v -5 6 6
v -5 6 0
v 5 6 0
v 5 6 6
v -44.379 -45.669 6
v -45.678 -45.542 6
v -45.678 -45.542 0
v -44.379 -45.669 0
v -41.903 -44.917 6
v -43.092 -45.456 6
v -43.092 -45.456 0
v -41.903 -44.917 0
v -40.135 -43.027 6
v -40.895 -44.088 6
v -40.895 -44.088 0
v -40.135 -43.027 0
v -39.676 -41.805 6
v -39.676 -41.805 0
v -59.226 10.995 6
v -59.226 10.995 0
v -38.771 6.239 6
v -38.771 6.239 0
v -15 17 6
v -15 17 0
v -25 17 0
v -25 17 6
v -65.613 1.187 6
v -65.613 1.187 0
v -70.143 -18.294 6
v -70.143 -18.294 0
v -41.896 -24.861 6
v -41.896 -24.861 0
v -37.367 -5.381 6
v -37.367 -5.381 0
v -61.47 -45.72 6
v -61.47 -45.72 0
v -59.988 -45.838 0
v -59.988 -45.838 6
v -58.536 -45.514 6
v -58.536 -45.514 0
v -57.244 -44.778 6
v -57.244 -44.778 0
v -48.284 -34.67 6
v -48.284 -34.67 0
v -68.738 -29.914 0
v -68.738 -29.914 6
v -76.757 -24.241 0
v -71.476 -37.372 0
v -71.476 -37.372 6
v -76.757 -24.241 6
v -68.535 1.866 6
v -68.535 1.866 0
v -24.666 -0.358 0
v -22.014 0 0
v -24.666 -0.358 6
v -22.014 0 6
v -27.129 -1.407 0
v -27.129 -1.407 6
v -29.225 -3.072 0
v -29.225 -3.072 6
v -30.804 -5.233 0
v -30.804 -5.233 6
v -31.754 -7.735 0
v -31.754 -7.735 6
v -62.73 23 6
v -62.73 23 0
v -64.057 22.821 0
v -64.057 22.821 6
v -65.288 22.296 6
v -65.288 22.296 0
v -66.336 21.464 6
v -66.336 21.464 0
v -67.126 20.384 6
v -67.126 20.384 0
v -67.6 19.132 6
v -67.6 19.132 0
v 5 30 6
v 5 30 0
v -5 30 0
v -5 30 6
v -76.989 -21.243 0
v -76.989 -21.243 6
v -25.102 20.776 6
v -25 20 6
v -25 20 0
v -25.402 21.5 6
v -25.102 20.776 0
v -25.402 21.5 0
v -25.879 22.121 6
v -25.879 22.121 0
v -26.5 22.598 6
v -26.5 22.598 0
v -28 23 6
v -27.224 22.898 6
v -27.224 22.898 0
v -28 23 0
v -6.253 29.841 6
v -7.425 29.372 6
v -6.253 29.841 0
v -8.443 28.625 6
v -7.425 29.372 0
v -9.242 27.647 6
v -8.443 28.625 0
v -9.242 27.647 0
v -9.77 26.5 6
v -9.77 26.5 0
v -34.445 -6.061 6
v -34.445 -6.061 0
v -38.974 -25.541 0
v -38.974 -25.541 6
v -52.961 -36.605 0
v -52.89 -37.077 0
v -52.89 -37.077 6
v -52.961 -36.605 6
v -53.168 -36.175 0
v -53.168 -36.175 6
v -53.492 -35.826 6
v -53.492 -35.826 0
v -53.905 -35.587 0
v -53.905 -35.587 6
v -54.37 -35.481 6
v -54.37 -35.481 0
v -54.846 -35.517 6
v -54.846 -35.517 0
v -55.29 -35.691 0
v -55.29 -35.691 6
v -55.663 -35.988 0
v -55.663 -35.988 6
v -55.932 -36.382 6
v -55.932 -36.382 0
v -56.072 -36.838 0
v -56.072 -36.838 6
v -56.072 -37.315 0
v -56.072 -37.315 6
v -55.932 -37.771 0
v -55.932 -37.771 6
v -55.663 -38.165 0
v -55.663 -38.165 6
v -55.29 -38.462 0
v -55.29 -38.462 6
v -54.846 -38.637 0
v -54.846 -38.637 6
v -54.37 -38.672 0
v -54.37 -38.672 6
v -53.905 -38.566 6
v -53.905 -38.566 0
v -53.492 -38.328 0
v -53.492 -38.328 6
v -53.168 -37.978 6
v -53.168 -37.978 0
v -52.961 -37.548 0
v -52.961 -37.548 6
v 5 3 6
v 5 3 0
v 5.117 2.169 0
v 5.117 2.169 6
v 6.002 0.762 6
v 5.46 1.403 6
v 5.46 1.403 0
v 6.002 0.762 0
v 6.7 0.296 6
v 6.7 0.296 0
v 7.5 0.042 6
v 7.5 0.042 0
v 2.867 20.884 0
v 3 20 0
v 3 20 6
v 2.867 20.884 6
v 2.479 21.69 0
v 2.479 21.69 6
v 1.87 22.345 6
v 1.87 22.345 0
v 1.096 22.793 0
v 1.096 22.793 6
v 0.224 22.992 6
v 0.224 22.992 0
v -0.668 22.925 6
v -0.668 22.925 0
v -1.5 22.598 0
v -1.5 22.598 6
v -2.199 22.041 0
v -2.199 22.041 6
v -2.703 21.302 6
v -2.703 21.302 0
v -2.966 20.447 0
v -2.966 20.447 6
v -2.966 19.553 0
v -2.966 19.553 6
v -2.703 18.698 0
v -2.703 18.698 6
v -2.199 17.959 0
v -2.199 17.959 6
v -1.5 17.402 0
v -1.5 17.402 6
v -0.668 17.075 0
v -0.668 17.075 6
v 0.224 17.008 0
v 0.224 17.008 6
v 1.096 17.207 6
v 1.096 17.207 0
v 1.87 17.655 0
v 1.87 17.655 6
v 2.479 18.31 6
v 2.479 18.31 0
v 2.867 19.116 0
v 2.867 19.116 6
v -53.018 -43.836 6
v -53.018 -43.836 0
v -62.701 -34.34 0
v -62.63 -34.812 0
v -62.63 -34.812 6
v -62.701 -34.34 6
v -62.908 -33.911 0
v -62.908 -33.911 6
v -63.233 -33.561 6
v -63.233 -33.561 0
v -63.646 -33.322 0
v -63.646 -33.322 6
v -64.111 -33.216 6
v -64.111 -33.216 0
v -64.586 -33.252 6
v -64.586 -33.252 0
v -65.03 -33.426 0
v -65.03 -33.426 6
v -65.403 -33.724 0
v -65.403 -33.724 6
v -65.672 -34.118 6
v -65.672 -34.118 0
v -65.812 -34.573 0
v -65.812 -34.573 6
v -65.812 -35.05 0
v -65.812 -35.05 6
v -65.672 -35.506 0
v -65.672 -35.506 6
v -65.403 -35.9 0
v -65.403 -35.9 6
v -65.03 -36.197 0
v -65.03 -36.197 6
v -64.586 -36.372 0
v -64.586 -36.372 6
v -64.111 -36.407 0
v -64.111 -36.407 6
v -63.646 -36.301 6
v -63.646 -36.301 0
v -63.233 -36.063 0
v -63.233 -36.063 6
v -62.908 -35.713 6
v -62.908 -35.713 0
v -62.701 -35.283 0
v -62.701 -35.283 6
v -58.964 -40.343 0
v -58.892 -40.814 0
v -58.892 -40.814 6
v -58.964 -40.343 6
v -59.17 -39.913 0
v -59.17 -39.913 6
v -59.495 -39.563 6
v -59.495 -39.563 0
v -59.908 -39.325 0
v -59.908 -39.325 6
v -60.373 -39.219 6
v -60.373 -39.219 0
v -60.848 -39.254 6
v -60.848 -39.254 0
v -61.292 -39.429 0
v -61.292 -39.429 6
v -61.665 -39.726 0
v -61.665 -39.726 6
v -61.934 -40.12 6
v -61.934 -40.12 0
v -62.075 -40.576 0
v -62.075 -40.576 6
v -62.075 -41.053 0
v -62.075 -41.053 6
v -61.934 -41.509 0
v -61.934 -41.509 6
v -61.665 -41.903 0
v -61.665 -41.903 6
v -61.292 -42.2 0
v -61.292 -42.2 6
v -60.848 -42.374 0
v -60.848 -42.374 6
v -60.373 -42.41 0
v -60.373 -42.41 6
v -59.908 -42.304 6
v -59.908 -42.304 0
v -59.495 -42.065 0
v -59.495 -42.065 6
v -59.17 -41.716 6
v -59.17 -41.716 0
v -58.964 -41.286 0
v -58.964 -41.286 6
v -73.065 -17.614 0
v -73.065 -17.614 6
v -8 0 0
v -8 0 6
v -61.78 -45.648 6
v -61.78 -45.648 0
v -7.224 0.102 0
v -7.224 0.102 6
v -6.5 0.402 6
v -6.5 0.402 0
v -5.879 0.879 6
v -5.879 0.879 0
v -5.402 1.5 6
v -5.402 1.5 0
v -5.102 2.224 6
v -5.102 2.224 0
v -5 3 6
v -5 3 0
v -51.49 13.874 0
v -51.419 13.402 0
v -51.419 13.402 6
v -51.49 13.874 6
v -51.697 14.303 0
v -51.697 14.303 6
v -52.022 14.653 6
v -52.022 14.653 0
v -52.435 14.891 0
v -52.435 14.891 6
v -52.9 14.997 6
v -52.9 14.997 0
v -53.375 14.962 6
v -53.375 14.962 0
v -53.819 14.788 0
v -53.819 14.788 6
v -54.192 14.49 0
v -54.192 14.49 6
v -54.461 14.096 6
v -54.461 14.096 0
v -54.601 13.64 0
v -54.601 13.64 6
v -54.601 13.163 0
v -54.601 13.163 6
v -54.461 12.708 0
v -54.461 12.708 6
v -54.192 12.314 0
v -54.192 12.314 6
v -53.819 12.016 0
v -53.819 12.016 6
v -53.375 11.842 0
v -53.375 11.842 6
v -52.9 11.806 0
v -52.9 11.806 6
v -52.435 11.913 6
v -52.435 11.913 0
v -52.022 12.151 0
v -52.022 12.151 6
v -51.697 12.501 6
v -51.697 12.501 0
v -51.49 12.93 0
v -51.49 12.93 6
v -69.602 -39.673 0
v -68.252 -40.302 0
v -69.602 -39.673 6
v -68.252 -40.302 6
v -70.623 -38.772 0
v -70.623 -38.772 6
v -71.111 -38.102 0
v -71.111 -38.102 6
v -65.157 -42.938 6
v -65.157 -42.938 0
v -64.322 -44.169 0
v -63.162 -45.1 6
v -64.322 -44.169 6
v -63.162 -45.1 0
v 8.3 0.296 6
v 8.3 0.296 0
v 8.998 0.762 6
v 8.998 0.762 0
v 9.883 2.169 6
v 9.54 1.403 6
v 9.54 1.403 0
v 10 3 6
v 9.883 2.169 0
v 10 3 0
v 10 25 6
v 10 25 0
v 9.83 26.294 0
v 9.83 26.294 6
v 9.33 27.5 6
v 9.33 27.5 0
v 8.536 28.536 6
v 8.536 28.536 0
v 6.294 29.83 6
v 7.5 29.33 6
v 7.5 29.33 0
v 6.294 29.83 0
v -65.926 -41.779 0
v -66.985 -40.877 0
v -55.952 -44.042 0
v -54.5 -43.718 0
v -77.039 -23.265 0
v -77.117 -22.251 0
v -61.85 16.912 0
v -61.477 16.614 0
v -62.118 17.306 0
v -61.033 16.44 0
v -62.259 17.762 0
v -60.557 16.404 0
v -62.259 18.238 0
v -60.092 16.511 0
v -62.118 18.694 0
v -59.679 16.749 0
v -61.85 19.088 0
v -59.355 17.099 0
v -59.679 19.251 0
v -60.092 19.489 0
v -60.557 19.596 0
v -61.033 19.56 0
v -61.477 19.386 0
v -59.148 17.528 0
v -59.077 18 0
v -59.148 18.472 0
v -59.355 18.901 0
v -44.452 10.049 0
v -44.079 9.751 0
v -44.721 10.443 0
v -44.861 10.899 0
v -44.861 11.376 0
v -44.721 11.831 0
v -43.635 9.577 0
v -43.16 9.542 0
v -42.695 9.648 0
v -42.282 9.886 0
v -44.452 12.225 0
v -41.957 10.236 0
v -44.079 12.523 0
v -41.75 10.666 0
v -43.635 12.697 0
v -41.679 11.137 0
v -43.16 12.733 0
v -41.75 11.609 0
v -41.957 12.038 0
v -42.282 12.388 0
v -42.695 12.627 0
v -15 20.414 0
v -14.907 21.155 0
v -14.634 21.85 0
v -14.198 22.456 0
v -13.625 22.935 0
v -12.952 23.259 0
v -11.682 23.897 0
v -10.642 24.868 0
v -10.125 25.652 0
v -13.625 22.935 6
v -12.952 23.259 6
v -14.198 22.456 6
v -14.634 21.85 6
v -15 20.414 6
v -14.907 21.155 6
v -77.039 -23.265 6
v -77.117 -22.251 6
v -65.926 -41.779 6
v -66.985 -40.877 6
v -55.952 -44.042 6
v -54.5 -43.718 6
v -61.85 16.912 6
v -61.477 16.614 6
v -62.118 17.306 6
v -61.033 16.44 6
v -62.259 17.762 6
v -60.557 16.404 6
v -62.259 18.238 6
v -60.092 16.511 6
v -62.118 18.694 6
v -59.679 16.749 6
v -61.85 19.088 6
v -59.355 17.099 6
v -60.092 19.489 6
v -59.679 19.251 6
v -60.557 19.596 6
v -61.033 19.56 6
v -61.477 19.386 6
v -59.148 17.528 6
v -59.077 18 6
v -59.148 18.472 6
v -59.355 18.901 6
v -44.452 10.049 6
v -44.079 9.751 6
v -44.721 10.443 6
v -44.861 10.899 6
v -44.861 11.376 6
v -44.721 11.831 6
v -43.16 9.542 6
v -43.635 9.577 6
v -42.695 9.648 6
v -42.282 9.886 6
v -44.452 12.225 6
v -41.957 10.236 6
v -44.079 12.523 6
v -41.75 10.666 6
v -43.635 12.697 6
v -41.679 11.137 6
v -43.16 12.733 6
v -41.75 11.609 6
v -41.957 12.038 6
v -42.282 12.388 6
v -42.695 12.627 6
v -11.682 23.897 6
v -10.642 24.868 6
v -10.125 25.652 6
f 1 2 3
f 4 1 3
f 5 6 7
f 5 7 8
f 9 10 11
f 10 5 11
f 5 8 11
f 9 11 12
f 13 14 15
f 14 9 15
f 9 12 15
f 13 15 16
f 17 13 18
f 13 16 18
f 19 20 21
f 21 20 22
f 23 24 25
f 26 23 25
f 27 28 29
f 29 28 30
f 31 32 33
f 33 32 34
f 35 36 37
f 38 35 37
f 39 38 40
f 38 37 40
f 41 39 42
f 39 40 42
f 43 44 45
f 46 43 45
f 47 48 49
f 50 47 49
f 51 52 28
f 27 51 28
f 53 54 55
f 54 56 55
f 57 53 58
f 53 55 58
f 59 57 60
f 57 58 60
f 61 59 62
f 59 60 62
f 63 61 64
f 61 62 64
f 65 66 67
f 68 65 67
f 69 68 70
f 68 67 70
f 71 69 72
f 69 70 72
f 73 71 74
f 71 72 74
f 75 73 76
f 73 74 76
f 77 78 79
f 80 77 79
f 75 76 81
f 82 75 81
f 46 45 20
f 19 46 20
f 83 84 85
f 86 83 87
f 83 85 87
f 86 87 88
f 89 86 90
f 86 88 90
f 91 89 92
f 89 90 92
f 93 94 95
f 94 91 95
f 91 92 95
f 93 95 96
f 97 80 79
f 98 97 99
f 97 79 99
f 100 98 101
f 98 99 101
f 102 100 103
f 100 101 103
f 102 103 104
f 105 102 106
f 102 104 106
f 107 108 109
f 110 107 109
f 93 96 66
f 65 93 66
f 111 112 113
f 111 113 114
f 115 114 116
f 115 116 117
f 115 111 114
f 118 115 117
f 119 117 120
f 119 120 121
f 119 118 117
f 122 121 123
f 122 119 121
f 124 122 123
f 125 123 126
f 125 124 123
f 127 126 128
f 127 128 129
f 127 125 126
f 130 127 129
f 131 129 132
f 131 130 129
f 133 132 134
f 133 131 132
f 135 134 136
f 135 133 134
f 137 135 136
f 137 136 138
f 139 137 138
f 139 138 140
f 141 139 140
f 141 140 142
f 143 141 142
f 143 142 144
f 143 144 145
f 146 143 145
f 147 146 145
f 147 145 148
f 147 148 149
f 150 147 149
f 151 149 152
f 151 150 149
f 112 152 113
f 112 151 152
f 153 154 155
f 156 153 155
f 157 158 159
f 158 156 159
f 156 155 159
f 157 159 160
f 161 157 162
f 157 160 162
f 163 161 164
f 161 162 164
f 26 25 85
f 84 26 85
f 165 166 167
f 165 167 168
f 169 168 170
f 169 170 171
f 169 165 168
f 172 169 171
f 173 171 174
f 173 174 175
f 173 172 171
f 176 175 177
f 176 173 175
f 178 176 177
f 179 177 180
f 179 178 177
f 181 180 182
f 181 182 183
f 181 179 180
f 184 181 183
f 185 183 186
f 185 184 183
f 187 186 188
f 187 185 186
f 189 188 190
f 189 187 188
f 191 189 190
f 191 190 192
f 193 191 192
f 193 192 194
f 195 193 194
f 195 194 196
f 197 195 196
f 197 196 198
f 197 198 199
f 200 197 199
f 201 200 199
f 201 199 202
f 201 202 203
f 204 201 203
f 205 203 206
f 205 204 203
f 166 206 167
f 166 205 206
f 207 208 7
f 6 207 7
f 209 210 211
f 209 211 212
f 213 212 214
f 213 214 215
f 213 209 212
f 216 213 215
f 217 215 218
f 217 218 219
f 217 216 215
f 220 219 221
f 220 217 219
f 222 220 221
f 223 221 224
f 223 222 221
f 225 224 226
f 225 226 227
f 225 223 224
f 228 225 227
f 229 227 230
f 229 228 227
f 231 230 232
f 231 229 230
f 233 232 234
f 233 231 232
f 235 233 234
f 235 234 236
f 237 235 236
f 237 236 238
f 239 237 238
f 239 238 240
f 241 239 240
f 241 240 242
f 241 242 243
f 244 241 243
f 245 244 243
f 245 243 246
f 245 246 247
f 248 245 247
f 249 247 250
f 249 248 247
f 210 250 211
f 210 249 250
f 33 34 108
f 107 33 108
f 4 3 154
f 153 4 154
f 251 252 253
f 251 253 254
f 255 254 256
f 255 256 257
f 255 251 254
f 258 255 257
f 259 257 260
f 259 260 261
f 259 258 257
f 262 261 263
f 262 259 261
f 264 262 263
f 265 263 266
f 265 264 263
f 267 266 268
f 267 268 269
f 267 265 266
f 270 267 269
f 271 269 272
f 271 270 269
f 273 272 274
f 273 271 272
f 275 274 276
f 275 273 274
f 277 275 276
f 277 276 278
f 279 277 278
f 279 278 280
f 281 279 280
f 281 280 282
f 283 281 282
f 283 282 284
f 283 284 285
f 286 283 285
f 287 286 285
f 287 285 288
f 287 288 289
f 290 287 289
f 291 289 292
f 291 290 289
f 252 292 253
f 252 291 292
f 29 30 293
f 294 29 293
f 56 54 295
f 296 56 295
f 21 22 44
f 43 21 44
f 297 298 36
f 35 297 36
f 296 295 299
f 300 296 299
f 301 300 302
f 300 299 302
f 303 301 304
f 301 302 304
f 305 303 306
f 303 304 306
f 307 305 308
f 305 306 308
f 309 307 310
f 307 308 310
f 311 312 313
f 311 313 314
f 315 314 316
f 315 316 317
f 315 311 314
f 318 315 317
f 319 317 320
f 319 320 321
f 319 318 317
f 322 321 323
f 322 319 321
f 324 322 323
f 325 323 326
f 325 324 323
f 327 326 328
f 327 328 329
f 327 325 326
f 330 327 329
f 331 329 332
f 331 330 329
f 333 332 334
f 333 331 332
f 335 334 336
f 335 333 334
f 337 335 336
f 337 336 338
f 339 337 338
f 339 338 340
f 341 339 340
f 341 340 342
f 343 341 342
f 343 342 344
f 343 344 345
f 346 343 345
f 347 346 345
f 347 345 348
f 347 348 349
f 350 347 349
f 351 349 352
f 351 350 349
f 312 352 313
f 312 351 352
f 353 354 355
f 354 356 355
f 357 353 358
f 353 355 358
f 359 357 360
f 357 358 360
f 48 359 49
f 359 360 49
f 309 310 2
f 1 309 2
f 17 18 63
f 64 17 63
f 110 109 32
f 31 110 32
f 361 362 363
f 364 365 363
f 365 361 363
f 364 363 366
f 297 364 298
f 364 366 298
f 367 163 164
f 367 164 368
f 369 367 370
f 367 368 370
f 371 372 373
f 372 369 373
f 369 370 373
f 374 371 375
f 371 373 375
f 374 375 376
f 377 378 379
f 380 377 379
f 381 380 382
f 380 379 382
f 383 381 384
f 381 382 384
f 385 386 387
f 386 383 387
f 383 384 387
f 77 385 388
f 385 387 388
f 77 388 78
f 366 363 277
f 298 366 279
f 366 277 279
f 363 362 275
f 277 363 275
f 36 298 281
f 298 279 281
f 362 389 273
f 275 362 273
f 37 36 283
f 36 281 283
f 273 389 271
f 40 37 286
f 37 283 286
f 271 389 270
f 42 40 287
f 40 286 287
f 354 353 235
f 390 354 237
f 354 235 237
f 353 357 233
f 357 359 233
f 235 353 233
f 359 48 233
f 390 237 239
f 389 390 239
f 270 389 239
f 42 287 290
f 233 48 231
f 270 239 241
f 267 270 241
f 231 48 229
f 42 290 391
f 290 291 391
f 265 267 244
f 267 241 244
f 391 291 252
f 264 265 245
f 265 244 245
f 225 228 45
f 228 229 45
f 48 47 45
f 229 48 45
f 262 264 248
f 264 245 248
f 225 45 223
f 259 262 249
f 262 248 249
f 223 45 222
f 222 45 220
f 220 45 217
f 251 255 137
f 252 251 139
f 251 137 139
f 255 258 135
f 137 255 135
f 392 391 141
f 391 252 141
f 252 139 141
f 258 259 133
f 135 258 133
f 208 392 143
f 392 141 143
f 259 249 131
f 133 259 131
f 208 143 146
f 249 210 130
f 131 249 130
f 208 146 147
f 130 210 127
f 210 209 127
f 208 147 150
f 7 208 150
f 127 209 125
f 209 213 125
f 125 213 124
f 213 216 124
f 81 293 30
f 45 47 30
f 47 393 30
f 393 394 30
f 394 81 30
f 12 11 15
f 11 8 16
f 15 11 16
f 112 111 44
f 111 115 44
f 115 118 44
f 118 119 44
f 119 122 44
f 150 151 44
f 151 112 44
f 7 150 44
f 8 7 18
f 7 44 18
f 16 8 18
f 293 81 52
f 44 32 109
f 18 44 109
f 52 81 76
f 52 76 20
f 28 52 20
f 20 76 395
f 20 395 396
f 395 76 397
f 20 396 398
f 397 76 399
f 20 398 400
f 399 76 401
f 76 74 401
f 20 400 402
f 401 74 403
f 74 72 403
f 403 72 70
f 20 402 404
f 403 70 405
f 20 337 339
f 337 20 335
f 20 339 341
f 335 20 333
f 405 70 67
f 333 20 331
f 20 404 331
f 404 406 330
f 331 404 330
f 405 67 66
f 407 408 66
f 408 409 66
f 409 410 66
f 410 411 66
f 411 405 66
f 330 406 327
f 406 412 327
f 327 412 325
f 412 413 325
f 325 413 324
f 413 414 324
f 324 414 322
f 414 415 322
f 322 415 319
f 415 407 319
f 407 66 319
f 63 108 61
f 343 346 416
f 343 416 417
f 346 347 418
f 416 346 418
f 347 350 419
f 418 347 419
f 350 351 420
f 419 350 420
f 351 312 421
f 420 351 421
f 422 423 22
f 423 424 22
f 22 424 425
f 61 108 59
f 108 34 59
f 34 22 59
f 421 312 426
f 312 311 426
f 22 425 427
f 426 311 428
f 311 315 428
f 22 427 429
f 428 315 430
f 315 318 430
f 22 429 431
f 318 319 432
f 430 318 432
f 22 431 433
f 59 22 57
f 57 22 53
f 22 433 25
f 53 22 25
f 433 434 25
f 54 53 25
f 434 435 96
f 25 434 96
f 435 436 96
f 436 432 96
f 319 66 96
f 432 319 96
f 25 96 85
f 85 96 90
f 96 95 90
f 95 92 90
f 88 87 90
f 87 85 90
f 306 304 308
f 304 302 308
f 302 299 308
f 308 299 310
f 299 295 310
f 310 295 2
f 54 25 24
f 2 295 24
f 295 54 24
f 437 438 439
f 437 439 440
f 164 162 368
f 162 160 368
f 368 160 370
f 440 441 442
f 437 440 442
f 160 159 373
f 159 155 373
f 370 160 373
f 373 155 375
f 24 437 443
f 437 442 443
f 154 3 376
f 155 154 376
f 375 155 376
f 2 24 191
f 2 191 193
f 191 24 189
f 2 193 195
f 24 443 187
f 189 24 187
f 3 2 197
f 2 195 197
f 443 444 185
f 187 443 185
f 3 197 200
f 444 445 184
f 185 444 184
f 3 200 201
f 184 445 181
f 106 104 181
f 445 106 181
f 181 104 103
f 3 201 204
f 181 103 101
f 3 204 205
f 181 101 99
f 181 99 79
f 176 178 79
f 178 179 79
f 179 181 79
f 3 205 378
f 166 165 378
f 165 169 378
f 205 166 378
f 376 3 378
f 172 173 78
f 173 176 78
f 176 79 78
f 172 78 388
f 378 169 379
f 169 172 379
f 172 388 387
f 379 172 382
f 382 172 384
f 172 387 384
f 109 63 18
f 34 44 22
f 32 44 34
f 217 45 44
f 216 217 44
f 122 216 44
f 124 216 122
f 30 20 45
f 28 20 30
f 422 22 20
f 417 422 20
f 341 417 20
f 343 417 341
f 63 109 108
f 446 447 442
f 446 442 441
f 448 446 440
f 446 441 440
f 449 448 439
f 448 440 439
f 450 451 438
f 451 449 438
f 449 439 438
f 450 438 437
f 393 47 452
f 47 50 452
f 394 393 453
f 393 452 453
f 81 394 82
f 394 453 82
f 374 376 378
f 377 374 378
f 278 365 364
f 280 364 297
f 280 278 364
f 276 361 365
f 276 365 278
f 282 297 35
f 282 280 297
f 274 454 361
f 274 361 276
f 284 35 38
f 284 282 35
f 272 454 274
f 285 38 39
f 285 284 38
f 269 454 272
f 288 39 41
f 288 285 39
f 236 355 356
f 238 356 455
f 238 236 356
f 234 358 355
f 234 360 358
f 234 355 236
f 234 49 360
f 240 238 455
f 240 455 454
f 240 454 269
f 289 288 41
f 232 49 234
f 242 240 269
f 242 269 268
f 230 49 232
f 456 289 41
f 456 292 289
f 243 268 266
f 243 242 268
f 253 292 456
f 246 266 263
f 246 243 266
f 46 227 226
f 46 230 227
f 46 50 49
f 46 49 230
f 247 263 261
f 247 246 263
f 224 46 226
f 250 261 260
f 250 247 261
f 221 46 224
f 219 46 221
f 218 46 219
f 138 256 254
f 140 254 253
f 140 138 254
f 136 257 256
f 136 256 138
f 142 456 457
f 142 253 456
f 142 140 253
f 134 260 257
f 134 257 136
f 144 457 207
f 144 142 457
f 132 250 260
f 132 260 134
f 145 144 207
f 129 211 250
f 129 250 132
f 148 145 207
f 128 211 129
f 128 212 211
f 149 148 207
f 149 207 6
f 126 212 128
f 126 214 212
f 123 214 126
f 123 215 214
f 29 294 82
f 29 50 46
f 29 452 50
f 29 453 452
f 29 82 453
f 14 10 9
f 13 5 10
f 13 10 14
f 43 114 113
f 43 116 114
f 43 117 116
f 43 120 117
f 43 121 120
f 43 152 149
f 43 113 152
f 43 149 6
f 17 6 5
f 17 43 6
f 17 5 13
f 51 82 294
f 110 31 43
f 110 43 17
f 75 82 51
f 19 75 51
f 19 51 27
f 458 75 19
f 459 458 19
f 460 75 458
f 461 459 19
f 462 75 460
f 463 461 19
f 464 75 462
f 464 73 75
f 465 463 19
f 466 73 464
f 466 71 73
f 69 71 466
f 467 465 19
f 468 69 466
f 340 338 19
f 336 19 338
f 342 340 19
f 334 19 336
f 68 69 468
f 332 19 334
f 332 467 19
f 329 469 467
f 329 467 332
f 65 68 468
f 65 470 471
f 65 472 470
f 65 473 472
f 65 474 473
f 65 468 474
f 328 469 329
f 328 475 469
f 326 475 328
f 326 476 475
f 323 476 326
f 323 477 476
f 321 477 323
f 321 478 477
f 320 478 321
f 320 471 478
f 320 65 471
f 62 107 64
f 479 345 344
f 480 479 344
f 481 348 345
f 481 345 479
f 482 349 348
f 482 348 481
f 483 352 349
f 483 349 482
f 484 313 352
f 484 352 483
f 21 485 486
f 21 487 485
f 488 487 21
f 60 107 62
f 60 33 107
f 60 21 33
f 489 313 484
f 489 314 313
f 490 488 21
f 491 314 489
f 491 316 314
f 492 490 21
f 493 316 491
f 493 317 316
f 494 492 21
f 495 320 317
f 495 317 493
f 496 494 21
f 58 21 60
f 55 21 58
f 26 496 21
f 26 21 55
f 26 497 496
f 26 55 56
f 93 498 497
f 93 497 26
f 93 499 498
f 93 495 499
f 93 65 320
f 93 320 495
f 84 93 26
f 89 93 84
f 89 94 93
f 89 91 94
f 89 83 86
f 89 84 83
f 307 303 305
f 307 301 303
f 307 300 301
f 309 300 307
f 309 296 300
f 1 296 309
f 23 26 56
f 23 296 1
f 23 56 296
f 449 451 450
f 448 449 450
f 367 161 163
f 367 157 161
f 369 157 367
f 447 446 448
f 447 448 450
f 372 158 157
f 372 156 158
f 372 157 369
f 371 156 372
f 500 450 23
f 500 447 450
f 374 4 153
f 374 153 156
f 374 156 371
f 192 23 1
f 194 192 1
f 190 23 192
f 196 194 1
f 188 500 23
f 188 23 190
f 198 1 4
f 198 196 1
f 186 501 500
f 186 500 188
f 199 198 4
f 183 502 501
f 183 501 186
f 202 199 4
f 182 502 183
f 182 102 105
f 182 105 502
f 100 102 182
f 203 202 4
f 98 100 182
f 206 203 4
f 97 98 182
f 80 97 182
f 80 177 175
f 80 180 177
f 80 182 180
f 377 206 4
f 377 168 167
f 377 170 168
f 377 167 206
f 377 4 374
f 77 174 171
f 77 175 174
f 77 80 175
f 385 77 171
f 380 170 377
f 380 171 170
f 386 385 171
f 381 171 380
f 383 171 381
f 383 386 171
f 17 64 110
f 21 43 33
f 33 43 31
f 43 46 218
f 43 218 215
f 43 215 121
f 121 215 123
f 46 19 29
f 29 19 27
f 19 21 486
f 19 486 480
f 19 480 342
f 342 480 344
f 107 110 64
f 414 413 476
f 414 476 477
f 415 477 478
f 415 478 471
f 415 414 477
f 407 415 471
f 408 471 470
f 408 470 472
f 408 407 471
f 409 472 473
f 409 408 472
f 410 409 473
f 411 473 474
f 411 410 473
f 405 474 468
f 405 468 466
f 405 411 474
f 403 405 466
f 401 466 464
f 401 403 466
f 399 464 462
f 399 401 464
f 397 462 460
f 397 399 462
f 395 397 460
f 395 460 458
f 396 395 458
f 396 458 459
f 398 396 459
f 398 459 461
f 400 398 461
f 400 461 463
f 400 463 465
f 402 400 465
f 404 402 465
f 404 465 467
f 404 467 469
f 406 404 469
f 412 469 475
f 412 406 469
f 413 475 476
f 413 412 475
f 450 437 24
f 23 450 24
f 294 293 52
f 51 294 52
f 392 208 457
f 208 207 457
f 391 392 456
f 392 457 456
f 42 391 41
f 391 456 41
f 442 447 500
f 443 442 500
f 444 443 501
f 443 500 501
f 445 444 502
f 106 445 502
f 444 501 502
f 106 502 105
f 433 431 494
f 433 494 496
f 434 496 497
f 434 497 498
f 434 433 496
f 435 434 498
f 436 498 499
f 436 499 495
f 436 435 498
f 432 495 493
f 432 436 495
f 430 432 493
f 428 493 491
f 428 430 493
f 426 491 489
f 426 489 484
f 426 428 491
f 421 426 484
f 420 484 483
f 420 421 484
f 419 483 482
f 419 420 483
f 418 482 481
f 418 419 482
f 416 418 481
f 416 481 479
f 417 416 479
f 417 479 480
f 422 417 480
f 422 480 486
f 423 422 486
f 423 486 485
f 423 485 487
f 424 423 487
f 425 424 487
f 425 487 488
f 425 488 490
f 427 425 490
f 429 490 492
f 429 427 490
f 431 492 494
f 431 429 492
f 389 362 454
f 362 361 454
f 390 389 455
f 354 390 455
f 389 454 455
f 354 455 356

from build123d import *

# Parameters (mm, degrees)
ESBO_O1_R                = 1.599999999999999
ESBO_O1_R_2              = 1.600000000000006
ESBO_O1_R_3              = 1.5999999999999974
ESBO_O1_R_4              = 1.5999999999999985
ESBO_O1_R_5              = 1.5999999999999979
ESBO_O1_R_6              = 1.600000000000005
ESBO_O1_R_7              = 3.0000000000000013
RESSALTO_EXTRUS_O1_DEPTH = 6
FILETE1_R                = 10
FILETE2_R                = 5
FILETE4_R                = 5
FILETE5_R                = 3
CHANFRO1_SIZE            = 15
CHANFRO1_SIZE2           = 10.50311307314568
FILETE6_R                = 5


# Some blends are built 0.0001 mm under size
with BuildPart() as part:
    # Esboço1 → Ressalto-extrusão1 (new body)
    with BuildSketch(Plane.XY):
        Polygon((10.000000000000002, -2e-17), (9.999999999999998, 30.00000000000003), (-10.000000000000002, 30.000000000000025), (-10.000000000000002, 23.000000000000007), (-15.00000000000002, 22.99999999999999), (-15, 16.999999999999996), (-25, 17), (-25.000000000000007, 22.999999999999993), (-66.7010377283415, 23.00000000000001), (-80.7428791412217, -37.388961654722294), (-65.64563872754113, -40.899422007942356), (-66.49494365170727, -44.55198017254248), (-56.754788546106894, -46.81679330365219), (-55.90548362194075, -43.16423513905207), (-40.8082432082602, -46.674695492272136), (-29.95528839436153, 0), (-5.0000000000000036, -3e-17), (-5.000000000000001, 5.999999999999998), (4.999999999999999, 6), (5, -9.54e-15), align=None)
        with Locations((-60.49245953335221, -40.814309185297155)):
            Circle(ESBO_O1_R, mode=Mode.SUBTRACT)
        with Locations((-64.23013052059758, -34.81182506694214)):
            Circle(ESBO_O1_R_2, mode=Mode.SUBTRACT)
        with Locations((-54.48997541499719, -37.07663819805185)):
            Circle(ESBO_O1_R_3, mode=Mode.SUBTRACT)
        Polygon((-70.14267850253108, -18.293523811627352), (-73.06472503421121, -17.614079872294436), (-68.53509877199178, 1.8662303389063057), (-65.61305224031166, 1.1867863995733938), align=None, mode=Mode.SUBTRACT)
        Polygon((-48.28358518275084, -34.66972725556205), (-68.73791090451164, -29.91361968023165), (-59.22569575385083, 10.995031763289926), (-38.771370032090054, 6.238924187959523), align=None, mode=Mode.SUBTRACT)
        Polygon((-34.44455590239049, -6.060615619977673), (-38.97418216460991, -25.540925831178406), (-41.89622869629001, -24.861481891845497), (-37.3666024340706, -5.3811716806447585), align=None, mode=Mode.SUBTRACT)
        with Locations((-60.67691042150691, 18.000000000000004)):
            Circle(ESBO_O1_R_4, mode=Mode.SUBTRACT)
        with Locations((-53.019305521604494, 13.40194270577972)):
            Circle(ESBO_O1_R_5, mode=Mode.SUBTRACT)
        with Locations((-43.2791504160041, 11.137129574670004)):
            Circle(ESBO_O1_R_6, mode=Mode.SUBTRACT)
        with Locations((-2.44e-15, 20)):
            Circle(ESBO_O1_R_7, mode=Mode.SUBTRACT)
    extrude(amount=RESSALTO_EXTRUS_O1_DEPTH)

    # Filete1
    filete1_edges = [part.edges().sort_by_distance(p)[0] for p in [
        (-29.95528839436153, -3e-17, 3),
    ]]
    fillet(filete1_edges, radius=FILETE1_R)

    # Filete2
    # the kernel refuses this fillet: 5 mm, written as the material it takes off along each edge
    with BuildSketch(Plane(origin=(-66.70103772834149, 23.00000000000001, -9.926929788370014), x_dir=(-0.22648131311097233, -0.974015510560037, 0), z_dir=(0, 0, 1))) as filete2_piece_1:
        with BuildLine():
            CenterArc((FILETE2_R * 0.79415438307, FILETE2_R), FILETE2_R, 193.08999999999958, 76.91000000000048)
            Line((-FILETE2_R * 0.17986112749, FILETE2_R * 0.773518686889), (-FILETE2_R * 0.199341437702, FILETE2_R * 0.768989060627))
            Line((-FILETE2_R * 0.199341437702, FILETE2_R * 0.768989060627), (-FILETE2_R * 0.0158830876614, -FILETE2_R * 0.02))
            Line((-FILETE2_R * 0.0158830876614, -FILETE2_R * 0.02), (FILETE2_R * 0.79415438307, -FILETE2_R * 0.02))
            Line((FILETE2_R * 0.79415438307, -FILETE2_R * 0.02), (FILETE2_R * 0.79415438307, 6e-17))
        make_face()
    extrude(amount=25.853859576740028, mode=Mode.SUBTRACT)
    with BuildSketch(Plane(origin=(-66.49494365170727, -44.55198017254248, -12.103072956898195), x_dir=(0.9740155105600374, -0.22648131311097125, 0), z_dir=(0, 0, 1))) as filete2_piece_2:
        with BuildLine():
            CenterArc((4.841229182759275, 5.000000000000003), FILETE2_R, 194.4775121859302, 75.52248781406985)
            Line((1.133e-14, 3.7499999999999782), (-0.09682458365516827, 3.7249999999999814))
            ThreePointArc((-0.09682458365516827, 3.7249999999999814), (-0.10000000000000146, 1.874999999999995), (-0.10000000000000632, 2.39e-15))
            Line((-0.10000000000000632, 2.39e-15), (-4e-15, -0.0999999999999994))
            Line((-4e-15, -0.0999999999999994), (4.841229182759282, -0.09999999999999787))
            Line((4.841229182759282, -0.09999999999999787), (4.841229182759279, -9e-17))
        make_face()
    extrude(amount=30.20614591379639, mode=Mode.SUBTRACT)
    with BuildSketch(Plane(origin=(-56.754788546106894, -46.81679330365219, -12.103072956898142), x_dir=(0.22648131311097194, 0.9740155105600371, 0), z_dir=(0, 0, 1))) as filete2_piece_3:
        with BuildLine():
            CenterArc((4.9999999999999964, 4.841229182759264), FILETE2_R, 180.00000000000009, 75.52248781406979)
            Line((-5.64e-15, 4.841229182759256), (-0.10000000000000338, 4.841229182759253))
            Line((-0.10000000000000338, 4.841229182759253), (-0.09999999999999777, -2.99e-15))
            Line((-0.09999999999999777, -2.99e-15), (2.99e-15, -0.09999999999999777))
            ThreePointArc((2.99e-15, -0.09999999999999777), (1.8749999999999951, -0.10000000000000121), (3.724999999999985, -0.09682458365518365))
            Line((3.724999999999985, -0.09682458365518365), (3.7499999999999827, 3e-17))
        make_face()
    extrude(amount=30.206145913796284, mode=Mode.SUBTRACT)
    with BuildSketch(Plane(origin=(-40.8082432082602, -46.674695492272136, -12.500000000000021), x_dir=(0.22648131311097006, 0.9740155105600377, 0), z_dir=(0, 0, 1))) as filete2_piece_4:
        with BuildLine():
            CenterArc((FILETE2_R, FILETE2_R), FILETE2_R, 179.9999999999999, 90)
            Line((2.239e-14, FILETE2_R), (-FILETE2_R * 0.02, FILETE2_R))
            Line((-FILETE2_R * 0.02, FILETE2_R), (-FILETE2_R * 0.02, -FILETE2_R * 0.02))
            Line((-FILETE2_R * 0.02, -FILETE2_R * 0.02), (FILETE2_R, -FILETE2_R * 0.02))
            Line((FILETE2_R, -FILETE2_R * 0.02), (FILETE2_R, 6e-17))
        make_face()
    extrude(amount=31.000000000000043, mode=Mode.SUBTRACT)
    with BuildSketch(Plane(origin=(-10.000000000000002, 30.000000000000025, -12.499999999999996), x_dir=(1, 0, 0), z_dir=(0, 0, 1))) as filete2_piece_5:
        with BuildLine():
            CenterArc((FILETE2_R, -FILETE2_R), FILETE2_R, 90.00000000000001, 89.99999999999996)
            Line((-1.78e-15, -FILETE2_R), (-FILETE2_R * 0.02, -FILETE2_R))
            Line((-FILETE2_R * 0.02, -FILETE2_R), (-FILETE2_R * 0.02, FILETE2_R * 0.02))
            Line((-FILETE2_R * 0.02, FILETE2_R * 0.02), (FILETE2_R, FILETE2_R * 0.02))
            Line((FILETE2_R, FILETE2_R * 0.02), (FILETE2_R, 0))
        make_face()
    extrude(amount=30.999999999999993, mode=Mode.SUBTRACT)
    with BuildSketch(Plane(origin=(9.999999999999998, 30.00000000000003, -12.5), x_dir=(0, -1, 0), z_dir=(0, 0, 1))) as filete2_piece_6:
        with BuildLine():
            CenterArc((FILETE2_R, -FILETE2_R), FILETE2_R, 90, 90)
            Line((0, -FILETE2_R), (-FILETE2_R * 0.02, -FILETE2_R))
            Line((-FILETE2_R * 0.02, -FILETE2_R), (-FILETE2_R * 0.02, FILETE2_R * 0.02))
            Line((-FILETE2_R * 0.02, FILETE2_R * 0.02), (FILETE2_R, FILETE2_R * 0.02))
            Line((FILETE2_R, FILETE2_R * 0.02), (FILETE2_R, 0))
        make_face()
    extrude(amount=31, mode=Mode.SUBTRACT)

    # Filete4
    filete4_edges = [part.edges().sort_by_distance(p)[0] for p in [
        (-65.64563872754113, -40.89942200794236, 3),
        (-55.90548362194075, -43.16423513905207, 3),
        (-10.000000000000002, 23, 3),
    ]]
    fillet(filete4_edges, radius=FILETE4_R - 0.0001)  # a hair under: the kernel refuses the full size

    # Filete5
    # the kernel refuses this fillet: 3 mm, written as the material it takes off along each edge
    with BuildSketch(Plane(origin=(-25.000000000000007, 23.000000000000007, -7.499999999999991), x_dir=(-1, 0, 0), z_dir=(0, 0, 1))) as filete5_piece_1:
        with BuildLine():
            CenterArc((FILETE5_R, FILETE5_R), FILETE5_R, 180.00000000000006, 89.99999999999994)
            Line((-3.55e-15, FILETE5_R), (0, 0))
            Line((0, 0), (FILETE5_R, 0))
        make_face()
    extrude(amount=20.99999999999998, mode=Mode.SUBTRACT)
    with BuildSketch(Plane(origin=(-15.00000000000002, 22.99999999999999, -6.465722061975505), x_dir=(3.43e-15, -1, 0), z_dir=(0, 0, 1))) as filete5_piece_2:
        with BuildLine():
            CenterArc((2.5862888247905, 3), FILETE5_R, 198.50689627931516, 71.49310372068487)
            Line((-0.25856754520870956, 2.0477436090658623), (-0.5430531822086313, 1.9525179699724493))
            ThreePointArc((-0.5430531822086313, 1.9525179699724493), (-0.2999999999996936, 0.4606813660513637), (-0.3000000000000007, 1.03e-15))
            Line((-0.3000000000000007, 1.03e-15), (-1.03e-15, -0.3000000000000007))
            Line((-1.03e-15, -0.3000000000000007), (2.5862888247904996, -0.3000000000000007))
            Line((2.5862888247904996, -0.3000000000000007), (2.5862888247905005, 0))
        make_face()
    extrude(amount=18.93144412395101, mode=Mode.SUBTRACT)
    with BuildSketch(Plane(origin=(-5.0000000000000036, -3e-17, -7.5), x_dir=(-1, 1e-17, 0), z_dir=(0, 0, 1))) as filete5_piece_3:
        with BuildLine():
            CenterArc((FILETE5_R, -FILETE5_R), FILETE5_R, 90, 90)
            Line((3e-17, -FILETE5_R), (0, 0))
            Line((0, 0), (FILETE5_R, 0))
        make_face()
    extrude(amount=21, mode=Mode.SUBTRACT)
    with BuildSketch(Plane(origin=(10.000000000000002, -2e-17, -7.500000000000002), x_dir=(-1, 1e-17, 0), z_dir=(0, 0, 1))) as filete5_piece_4:
        with BuildLine():
            CenterArc((FILETE5_R, -FILETE5_R), FILETE5_R, 90, 90)
            Line((1.79e-15, -FILETE5_R), (0, 0))
            Line((0, 0), (FILETE5_R, 0))
        make_face()
    extrude(amount=21, mode=Mode.SUBTRACT)
    with BuildSketch(Plane(origin=(5, 0, -7.5), x_dir=(-3e-16, 1, 0), z_dir=(0, 0, 1))) as filete5_piece_5:
        with BuildLine():
            CenterArc((FILETE5_R, -FILETE5_R), FILETE5_R, 90, 90)
            Line((-8.9e-16, -FILETE5_R), (0, 0))
            Line((0, 0), (FILETE5_R, 0))
        make_face()
    extrude(amount=21, mode=Mode.SUBTRACT)

    # Chanfro1
    chanfro1_edges = [part.edges().sort_by_distance(p)[0] for p in [
        (-80.7428791412217, -37.388961654722294, 3),
    ]]
    chanfro1_side = [part.faces().sort_by_distance(p)[0] for p in [
        (-74.1716112535079, -9.128277544584641, 3),
    ]]
    chamfer(chanfro1_edges, length=CHANFRO1_SIZE, length2=CHANFRO1_SIZE2, reference=chanfro1_side[0])

    # Filete6
    filete6_edges = [part.edges().sort_by_distance(p)[0] for p in [
        (-77.34565944455714, -22.778728996321732, 3),
        (-70.51268409881192, -39.76772049528134, 3),
    ]]
    fillet(filete6_edges, radius=FILETE6_R)


solid = part.part
